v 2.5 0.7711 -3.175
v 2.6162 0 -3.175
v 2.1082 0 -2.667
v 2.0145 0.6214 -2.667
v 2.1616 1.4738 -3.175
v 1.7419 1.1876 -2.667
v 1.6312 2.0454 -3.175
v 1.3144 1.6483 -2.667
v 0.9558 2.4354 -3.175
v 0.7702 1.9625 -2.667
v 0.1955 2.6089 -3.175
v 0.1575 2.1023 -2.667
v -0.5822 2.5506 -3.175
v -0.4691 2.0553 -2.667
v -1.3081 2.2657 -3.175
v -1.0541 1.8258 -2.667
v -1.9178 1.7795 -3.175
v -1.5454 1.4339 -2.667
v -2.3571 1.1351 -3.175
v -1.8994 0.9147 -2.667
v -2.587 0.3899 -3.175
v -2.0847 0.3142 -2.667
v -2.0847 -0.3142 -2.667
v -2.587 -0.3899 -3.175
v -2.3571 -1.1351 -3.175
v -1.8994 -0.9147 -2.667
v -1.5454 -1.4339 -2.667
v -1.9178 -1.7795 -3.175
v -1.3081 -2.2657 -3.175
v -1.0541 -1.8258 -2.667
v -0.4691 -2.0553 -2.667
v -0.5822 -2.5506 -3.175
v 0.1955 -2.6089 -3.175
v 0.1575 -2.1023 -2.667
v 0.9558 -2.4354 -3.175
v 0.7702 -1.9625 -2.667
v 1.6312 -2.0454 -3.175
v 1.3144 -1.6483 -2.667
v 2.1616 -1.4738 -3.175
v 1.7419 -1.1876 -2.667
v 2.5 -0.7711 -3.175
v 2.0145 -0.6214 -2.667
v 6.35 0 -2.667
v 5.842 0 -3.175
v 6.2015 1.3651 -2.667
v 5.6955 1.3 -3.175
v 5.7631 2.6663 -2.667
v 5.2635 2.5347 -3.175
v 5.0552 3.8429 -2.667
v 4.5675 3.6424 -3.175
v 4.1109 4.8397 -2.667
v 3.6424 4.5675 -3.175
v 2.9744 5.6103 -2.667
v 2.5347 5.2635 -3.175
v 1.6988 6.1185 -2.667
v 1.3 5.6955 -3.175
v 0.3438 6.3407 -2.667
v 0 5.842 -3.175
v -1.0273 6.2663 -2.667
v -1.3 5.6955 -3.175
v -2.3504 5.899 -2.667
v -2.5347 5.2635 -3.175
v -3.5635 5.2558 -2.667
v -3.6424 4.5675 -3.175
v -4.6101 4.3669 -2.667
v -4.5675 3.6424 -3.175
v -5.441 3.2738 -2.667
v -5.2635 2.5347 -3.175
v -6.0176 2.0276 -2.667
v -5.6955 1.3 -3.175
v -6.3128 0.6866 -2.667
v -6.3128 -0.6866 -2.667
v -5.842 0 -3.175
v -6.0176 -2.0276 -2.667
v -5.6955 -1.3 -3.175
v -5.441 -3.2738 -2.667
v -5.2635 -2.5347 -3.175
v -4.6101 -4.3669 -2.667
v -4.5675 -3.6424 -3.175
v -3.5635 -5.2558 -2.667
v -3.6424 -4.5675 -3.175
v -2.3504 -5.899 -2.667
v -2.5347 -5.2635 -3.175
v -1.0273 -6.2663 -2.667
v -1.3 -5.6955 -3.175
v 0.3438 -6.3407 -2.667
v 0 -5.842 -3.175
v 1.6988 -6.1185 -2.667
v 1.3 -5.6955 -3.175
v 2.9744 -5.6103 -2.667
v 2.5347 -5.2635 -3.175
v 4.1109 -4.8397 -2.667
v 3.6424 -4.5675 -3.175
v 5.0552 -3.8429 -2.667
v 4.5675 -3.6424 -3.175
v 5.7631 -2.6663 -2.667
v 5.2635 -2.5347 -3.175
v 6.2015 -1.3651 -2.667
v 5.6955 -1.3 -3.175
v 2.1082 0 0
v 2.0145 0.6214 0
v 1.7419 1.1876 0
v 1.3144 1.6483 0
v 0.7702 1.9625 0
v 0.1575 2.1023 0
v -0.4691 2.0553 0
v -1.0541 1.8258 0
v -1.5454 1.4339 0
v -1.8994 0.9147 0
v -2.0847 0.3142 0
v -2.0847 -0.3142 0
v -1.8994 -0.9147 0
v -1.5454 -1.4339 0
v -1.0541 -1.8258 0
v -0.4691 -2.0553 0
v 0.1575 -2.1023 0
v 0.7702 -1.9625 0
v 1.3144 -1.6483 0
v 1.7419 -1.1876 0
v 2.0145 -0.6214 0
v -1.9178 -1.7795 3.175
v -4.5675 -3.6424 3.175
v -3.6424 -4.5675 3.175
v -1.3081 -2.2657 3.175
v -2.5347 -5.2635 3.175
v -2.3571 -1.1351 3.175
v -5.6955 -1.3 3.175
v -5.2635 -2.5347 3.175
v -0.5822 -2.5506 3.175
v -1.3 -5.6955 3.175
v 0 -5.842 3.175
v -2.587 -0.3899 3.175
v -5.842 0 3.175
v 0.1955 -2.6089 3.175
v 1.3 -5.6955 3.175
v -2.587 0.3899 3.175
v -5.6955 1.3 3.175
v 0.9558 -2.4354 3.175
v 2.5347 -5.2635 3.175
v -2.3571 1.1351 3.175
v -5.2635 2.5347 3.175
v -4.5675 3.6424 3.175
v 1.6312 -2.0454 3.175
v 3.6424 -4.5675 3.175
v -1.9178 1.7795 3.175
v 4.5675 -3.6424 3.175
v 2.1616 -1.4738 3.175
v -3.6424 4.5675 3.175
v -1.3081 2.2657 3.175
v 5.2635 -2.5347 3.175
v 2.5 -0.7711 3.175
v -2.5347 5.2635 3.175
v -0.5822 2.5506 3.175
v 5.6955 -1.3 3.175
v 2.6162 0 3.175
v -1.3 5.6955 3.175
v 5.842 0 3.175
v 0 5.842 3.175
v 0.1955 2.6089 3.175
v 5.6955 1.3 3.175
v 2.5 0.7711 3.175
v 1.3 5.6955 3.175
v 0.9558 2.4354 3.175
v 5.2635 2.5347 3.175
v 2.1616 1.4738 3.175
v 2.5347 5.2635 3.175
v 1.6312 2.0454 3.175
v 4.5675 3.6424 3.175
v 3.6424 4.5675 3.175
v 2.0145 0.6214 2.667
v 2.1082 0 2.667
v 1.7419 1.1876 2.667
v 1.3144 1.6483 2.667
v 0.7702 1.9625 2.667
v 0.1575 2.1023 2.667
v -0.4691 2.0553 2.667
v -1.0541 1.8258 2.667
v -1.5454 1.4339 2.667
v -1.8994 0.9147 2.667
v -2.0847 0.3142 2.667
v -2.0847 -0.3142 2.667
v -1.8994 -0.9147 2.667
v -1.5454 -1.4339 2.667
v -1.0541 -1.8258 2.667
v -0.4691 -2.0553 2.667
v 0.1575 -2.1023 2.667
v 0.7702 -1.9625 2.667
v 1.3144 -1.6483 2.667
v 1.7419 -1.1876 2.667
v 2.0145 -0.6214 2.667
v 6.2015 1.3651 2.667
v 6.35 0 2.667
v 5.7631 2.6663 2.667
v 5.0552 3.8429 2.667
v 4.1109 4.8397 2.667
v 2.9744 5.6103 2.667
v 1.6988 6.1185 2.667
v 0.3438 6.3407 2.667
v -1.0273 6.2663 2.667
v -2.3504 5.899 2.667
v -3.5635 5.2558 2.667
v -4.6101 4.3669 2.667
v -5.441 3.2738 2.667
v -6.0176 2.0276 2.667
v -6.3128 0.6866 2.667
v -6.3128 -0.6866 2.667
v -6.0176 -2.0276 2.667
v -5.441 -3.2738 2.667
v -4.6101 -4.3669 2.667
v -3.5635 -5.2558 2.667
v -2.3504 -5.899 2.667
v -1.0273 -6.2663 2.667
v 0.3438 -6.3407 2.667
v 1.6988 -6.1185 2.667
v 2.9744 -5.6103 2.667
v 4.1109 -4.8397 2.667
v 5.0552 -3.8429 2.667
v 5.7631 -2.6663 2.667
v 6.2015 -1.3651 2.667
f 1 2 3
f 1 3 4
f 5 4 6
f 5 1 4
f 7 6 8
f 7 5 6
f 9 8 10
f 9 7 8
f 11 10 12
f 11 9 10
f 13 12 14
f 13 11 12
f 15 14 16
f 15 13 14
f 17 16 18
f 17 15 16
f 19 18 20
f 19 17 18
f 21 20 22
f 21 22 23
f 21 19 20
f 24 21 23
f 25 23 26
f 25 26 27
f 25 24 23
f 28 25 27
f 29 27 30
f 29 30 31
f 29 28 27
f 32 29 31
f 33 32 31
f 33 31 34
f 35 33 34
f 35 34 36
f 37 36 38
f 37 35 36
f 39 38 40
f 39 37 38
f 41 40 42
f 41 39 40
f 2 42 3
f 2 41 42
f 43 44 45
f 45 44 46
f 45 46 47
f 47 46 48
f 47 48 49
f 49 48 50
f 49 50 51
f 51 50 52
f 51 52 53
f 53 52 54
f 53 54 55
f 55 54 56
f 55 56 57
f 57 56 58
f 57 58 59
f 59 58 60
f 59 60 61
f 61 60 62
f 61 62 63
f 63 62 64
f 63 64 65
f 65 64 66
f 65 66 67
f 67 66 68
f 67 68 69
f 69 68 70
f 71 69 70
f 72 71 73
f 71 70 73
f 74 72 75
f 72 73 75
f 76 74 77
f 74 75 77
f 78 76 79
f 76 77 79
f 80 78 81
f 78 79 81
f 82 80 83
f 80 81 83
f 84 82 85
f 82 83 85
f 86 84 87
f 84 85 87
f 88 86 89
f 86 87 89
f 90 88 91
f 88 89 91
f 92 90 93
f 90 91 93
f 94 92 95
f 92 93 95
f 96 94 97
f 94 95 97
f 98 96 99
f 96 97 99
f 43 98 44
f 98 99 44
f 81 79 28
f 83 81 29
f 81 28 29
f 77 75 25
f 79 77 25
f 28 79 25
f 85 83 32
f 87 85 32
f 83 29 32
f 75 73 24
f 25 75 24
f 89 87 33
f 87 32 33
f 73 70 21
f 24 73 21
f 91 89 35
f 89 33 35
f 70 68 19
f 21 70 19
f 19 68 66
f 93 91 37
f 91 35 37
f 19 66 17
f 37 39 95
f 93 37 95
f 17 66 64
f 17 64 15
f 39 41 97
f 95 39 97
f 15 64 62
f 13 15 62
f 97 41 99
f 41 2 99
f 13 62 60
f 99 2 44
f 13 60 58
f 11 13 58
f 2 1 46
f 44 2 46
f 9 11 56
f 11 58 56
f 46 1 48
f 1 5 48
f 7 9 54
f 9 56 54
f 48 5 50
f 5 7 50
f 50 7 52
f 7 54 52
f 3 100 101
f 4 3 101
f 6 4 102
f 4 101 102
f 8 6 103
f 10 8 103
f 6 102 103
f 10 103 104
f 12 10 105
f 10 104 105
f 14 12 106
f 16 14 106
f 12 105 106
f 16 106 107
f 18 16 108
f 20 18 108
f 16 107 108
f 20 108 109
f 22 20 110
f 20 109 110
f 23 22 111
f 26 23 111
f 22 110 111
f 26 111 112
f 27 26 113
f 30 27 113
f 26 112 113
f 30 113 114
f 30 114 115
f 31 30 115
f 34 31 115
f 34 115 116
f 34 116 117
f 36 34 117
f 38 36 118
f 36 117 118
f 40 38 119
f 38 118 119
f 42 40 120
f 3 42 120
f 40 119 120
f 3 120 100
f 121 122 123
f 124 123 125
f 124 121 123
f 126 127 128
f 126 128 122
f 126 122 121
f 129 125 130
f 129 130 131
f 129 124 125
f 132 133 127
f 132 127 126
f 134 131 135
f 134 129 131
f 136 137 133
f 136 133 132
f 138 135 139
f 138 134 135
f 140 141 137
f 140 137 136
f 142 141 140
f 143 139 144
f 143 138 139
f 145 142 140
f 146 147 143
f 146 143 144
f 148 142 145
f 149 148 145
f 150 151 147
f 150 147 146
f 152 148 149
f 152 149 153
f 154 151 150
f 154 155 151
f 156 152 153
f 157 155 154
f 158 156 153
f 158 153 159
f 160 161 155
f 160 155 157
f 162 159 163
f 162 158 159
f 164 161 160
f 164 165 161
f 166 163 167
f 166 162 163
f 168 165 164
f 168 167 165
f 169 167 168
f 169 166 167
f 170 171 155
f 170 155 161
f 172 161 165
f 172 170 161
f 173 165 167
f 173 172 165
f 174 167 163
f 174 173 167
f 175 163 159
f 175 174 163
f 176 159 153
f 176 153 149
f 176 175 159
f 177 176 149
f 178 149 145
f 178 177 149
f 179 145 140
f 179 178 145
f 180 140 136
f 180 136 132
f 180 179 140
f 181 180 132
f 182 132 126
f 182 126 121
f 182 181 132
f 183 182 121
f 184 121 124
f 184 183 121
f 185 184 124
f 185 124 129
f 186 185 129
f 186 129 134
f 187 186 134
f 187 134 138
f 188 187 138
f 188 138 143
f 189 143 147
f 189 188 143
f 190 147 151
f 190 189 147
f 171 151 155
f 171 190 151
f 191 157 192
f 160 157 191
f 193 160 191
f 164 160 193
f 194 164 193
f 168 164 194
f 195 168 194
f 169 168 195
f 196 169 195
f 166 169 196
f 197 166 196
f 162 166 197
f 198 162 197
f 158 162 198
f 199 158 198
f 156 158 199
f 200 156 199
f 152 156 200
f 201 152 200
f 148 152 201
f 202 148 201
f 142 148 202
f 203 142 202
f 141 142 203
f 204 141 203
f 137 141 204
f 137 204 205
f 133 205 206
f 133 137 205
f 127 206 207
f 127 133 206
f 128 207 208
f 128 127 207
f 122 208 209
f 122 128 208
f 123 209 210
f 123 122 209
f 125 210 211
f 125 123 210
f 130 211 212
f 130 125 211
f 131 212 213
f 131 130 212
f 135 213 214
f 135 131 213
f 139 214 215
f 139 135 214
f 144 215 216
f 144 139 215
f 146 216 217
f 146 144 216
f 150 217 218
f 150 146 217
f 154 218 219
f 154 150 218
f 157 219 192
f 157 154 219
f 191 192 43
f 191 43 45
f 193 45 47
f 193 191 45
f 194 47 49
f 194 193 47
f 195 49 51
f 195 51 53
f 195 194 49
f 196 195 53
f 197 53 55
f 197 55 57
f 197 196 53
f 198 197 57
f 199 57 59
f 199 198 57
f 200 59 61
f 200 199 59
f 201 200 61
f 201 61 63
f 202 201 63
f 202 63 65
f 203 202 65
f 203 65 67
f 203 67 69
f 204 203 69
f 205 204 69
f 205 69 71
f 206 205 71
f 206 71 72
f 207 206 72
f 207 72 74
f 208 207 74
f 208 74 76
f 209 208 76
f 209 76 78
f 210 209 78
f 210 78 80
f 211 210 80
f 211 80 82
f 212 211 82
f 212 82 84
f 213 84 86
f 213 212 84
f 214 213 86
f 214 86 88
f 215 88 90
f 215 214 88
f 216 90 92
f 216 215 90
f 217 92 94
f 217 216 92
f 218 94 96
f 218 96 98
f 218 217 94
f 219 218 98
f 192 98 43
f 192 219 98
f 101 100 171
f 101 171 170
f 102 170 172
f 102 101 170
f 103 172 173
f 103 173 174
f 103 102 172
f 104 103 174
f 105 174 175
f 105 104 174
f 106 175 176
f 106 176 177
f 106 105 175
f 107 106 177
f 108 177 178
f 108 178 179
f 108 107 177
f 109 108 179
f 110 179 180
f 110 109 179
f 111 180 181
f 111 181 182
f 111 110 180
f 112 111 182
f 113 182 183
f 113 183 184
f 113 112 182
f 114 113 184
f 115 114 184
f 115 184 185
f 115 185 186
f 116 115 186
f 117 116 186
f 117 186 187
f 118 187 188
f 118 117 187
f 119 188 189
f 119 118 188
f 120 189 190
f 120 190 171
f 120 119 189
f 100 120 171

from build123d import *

# Parameters (mm, degrees)
SKETCH3_R                = 6.35
SKETCH3_R_2              = 2.1082
BOSS_EXTRUDE1_DEPTH      = 3.175
BOSS_EXTRUDE1_DEPTH_BACK = 3.175
CHAMFER1_SIZE            = 0.508


with BuildPart() as part:
    # Sketch3 → Boss-Extrude1 (new body, two sides)
    with BuildSketch(Plane.XY) as boss_extrude1_sk:
        Circle(SKETCH3_R)
        Circle(SKETCH3_R_2, mode=Mode.SUBTRACT)
    extrude(amount=BOSS_EXTRUDE1_DEPTH)
    extrude(boss_extrude1_sk.sketch, amount=-BOSS_EXTRUDE1_DEPTH_BACK)

    # Chamfer1
    chamfer1_edges = [part.edges().sort_by_distance(p)[0] for p in [
        (-6.35, 0, -3.175),
        (-2.1082, 0, -3.175),
        (-6.35, 0, 3.175),
        (-2.1082, 0, 3.175),
    ]]
    chamfer(chamfer1_edges, length=CHAMFER1_SIZE)


solid = part.part
